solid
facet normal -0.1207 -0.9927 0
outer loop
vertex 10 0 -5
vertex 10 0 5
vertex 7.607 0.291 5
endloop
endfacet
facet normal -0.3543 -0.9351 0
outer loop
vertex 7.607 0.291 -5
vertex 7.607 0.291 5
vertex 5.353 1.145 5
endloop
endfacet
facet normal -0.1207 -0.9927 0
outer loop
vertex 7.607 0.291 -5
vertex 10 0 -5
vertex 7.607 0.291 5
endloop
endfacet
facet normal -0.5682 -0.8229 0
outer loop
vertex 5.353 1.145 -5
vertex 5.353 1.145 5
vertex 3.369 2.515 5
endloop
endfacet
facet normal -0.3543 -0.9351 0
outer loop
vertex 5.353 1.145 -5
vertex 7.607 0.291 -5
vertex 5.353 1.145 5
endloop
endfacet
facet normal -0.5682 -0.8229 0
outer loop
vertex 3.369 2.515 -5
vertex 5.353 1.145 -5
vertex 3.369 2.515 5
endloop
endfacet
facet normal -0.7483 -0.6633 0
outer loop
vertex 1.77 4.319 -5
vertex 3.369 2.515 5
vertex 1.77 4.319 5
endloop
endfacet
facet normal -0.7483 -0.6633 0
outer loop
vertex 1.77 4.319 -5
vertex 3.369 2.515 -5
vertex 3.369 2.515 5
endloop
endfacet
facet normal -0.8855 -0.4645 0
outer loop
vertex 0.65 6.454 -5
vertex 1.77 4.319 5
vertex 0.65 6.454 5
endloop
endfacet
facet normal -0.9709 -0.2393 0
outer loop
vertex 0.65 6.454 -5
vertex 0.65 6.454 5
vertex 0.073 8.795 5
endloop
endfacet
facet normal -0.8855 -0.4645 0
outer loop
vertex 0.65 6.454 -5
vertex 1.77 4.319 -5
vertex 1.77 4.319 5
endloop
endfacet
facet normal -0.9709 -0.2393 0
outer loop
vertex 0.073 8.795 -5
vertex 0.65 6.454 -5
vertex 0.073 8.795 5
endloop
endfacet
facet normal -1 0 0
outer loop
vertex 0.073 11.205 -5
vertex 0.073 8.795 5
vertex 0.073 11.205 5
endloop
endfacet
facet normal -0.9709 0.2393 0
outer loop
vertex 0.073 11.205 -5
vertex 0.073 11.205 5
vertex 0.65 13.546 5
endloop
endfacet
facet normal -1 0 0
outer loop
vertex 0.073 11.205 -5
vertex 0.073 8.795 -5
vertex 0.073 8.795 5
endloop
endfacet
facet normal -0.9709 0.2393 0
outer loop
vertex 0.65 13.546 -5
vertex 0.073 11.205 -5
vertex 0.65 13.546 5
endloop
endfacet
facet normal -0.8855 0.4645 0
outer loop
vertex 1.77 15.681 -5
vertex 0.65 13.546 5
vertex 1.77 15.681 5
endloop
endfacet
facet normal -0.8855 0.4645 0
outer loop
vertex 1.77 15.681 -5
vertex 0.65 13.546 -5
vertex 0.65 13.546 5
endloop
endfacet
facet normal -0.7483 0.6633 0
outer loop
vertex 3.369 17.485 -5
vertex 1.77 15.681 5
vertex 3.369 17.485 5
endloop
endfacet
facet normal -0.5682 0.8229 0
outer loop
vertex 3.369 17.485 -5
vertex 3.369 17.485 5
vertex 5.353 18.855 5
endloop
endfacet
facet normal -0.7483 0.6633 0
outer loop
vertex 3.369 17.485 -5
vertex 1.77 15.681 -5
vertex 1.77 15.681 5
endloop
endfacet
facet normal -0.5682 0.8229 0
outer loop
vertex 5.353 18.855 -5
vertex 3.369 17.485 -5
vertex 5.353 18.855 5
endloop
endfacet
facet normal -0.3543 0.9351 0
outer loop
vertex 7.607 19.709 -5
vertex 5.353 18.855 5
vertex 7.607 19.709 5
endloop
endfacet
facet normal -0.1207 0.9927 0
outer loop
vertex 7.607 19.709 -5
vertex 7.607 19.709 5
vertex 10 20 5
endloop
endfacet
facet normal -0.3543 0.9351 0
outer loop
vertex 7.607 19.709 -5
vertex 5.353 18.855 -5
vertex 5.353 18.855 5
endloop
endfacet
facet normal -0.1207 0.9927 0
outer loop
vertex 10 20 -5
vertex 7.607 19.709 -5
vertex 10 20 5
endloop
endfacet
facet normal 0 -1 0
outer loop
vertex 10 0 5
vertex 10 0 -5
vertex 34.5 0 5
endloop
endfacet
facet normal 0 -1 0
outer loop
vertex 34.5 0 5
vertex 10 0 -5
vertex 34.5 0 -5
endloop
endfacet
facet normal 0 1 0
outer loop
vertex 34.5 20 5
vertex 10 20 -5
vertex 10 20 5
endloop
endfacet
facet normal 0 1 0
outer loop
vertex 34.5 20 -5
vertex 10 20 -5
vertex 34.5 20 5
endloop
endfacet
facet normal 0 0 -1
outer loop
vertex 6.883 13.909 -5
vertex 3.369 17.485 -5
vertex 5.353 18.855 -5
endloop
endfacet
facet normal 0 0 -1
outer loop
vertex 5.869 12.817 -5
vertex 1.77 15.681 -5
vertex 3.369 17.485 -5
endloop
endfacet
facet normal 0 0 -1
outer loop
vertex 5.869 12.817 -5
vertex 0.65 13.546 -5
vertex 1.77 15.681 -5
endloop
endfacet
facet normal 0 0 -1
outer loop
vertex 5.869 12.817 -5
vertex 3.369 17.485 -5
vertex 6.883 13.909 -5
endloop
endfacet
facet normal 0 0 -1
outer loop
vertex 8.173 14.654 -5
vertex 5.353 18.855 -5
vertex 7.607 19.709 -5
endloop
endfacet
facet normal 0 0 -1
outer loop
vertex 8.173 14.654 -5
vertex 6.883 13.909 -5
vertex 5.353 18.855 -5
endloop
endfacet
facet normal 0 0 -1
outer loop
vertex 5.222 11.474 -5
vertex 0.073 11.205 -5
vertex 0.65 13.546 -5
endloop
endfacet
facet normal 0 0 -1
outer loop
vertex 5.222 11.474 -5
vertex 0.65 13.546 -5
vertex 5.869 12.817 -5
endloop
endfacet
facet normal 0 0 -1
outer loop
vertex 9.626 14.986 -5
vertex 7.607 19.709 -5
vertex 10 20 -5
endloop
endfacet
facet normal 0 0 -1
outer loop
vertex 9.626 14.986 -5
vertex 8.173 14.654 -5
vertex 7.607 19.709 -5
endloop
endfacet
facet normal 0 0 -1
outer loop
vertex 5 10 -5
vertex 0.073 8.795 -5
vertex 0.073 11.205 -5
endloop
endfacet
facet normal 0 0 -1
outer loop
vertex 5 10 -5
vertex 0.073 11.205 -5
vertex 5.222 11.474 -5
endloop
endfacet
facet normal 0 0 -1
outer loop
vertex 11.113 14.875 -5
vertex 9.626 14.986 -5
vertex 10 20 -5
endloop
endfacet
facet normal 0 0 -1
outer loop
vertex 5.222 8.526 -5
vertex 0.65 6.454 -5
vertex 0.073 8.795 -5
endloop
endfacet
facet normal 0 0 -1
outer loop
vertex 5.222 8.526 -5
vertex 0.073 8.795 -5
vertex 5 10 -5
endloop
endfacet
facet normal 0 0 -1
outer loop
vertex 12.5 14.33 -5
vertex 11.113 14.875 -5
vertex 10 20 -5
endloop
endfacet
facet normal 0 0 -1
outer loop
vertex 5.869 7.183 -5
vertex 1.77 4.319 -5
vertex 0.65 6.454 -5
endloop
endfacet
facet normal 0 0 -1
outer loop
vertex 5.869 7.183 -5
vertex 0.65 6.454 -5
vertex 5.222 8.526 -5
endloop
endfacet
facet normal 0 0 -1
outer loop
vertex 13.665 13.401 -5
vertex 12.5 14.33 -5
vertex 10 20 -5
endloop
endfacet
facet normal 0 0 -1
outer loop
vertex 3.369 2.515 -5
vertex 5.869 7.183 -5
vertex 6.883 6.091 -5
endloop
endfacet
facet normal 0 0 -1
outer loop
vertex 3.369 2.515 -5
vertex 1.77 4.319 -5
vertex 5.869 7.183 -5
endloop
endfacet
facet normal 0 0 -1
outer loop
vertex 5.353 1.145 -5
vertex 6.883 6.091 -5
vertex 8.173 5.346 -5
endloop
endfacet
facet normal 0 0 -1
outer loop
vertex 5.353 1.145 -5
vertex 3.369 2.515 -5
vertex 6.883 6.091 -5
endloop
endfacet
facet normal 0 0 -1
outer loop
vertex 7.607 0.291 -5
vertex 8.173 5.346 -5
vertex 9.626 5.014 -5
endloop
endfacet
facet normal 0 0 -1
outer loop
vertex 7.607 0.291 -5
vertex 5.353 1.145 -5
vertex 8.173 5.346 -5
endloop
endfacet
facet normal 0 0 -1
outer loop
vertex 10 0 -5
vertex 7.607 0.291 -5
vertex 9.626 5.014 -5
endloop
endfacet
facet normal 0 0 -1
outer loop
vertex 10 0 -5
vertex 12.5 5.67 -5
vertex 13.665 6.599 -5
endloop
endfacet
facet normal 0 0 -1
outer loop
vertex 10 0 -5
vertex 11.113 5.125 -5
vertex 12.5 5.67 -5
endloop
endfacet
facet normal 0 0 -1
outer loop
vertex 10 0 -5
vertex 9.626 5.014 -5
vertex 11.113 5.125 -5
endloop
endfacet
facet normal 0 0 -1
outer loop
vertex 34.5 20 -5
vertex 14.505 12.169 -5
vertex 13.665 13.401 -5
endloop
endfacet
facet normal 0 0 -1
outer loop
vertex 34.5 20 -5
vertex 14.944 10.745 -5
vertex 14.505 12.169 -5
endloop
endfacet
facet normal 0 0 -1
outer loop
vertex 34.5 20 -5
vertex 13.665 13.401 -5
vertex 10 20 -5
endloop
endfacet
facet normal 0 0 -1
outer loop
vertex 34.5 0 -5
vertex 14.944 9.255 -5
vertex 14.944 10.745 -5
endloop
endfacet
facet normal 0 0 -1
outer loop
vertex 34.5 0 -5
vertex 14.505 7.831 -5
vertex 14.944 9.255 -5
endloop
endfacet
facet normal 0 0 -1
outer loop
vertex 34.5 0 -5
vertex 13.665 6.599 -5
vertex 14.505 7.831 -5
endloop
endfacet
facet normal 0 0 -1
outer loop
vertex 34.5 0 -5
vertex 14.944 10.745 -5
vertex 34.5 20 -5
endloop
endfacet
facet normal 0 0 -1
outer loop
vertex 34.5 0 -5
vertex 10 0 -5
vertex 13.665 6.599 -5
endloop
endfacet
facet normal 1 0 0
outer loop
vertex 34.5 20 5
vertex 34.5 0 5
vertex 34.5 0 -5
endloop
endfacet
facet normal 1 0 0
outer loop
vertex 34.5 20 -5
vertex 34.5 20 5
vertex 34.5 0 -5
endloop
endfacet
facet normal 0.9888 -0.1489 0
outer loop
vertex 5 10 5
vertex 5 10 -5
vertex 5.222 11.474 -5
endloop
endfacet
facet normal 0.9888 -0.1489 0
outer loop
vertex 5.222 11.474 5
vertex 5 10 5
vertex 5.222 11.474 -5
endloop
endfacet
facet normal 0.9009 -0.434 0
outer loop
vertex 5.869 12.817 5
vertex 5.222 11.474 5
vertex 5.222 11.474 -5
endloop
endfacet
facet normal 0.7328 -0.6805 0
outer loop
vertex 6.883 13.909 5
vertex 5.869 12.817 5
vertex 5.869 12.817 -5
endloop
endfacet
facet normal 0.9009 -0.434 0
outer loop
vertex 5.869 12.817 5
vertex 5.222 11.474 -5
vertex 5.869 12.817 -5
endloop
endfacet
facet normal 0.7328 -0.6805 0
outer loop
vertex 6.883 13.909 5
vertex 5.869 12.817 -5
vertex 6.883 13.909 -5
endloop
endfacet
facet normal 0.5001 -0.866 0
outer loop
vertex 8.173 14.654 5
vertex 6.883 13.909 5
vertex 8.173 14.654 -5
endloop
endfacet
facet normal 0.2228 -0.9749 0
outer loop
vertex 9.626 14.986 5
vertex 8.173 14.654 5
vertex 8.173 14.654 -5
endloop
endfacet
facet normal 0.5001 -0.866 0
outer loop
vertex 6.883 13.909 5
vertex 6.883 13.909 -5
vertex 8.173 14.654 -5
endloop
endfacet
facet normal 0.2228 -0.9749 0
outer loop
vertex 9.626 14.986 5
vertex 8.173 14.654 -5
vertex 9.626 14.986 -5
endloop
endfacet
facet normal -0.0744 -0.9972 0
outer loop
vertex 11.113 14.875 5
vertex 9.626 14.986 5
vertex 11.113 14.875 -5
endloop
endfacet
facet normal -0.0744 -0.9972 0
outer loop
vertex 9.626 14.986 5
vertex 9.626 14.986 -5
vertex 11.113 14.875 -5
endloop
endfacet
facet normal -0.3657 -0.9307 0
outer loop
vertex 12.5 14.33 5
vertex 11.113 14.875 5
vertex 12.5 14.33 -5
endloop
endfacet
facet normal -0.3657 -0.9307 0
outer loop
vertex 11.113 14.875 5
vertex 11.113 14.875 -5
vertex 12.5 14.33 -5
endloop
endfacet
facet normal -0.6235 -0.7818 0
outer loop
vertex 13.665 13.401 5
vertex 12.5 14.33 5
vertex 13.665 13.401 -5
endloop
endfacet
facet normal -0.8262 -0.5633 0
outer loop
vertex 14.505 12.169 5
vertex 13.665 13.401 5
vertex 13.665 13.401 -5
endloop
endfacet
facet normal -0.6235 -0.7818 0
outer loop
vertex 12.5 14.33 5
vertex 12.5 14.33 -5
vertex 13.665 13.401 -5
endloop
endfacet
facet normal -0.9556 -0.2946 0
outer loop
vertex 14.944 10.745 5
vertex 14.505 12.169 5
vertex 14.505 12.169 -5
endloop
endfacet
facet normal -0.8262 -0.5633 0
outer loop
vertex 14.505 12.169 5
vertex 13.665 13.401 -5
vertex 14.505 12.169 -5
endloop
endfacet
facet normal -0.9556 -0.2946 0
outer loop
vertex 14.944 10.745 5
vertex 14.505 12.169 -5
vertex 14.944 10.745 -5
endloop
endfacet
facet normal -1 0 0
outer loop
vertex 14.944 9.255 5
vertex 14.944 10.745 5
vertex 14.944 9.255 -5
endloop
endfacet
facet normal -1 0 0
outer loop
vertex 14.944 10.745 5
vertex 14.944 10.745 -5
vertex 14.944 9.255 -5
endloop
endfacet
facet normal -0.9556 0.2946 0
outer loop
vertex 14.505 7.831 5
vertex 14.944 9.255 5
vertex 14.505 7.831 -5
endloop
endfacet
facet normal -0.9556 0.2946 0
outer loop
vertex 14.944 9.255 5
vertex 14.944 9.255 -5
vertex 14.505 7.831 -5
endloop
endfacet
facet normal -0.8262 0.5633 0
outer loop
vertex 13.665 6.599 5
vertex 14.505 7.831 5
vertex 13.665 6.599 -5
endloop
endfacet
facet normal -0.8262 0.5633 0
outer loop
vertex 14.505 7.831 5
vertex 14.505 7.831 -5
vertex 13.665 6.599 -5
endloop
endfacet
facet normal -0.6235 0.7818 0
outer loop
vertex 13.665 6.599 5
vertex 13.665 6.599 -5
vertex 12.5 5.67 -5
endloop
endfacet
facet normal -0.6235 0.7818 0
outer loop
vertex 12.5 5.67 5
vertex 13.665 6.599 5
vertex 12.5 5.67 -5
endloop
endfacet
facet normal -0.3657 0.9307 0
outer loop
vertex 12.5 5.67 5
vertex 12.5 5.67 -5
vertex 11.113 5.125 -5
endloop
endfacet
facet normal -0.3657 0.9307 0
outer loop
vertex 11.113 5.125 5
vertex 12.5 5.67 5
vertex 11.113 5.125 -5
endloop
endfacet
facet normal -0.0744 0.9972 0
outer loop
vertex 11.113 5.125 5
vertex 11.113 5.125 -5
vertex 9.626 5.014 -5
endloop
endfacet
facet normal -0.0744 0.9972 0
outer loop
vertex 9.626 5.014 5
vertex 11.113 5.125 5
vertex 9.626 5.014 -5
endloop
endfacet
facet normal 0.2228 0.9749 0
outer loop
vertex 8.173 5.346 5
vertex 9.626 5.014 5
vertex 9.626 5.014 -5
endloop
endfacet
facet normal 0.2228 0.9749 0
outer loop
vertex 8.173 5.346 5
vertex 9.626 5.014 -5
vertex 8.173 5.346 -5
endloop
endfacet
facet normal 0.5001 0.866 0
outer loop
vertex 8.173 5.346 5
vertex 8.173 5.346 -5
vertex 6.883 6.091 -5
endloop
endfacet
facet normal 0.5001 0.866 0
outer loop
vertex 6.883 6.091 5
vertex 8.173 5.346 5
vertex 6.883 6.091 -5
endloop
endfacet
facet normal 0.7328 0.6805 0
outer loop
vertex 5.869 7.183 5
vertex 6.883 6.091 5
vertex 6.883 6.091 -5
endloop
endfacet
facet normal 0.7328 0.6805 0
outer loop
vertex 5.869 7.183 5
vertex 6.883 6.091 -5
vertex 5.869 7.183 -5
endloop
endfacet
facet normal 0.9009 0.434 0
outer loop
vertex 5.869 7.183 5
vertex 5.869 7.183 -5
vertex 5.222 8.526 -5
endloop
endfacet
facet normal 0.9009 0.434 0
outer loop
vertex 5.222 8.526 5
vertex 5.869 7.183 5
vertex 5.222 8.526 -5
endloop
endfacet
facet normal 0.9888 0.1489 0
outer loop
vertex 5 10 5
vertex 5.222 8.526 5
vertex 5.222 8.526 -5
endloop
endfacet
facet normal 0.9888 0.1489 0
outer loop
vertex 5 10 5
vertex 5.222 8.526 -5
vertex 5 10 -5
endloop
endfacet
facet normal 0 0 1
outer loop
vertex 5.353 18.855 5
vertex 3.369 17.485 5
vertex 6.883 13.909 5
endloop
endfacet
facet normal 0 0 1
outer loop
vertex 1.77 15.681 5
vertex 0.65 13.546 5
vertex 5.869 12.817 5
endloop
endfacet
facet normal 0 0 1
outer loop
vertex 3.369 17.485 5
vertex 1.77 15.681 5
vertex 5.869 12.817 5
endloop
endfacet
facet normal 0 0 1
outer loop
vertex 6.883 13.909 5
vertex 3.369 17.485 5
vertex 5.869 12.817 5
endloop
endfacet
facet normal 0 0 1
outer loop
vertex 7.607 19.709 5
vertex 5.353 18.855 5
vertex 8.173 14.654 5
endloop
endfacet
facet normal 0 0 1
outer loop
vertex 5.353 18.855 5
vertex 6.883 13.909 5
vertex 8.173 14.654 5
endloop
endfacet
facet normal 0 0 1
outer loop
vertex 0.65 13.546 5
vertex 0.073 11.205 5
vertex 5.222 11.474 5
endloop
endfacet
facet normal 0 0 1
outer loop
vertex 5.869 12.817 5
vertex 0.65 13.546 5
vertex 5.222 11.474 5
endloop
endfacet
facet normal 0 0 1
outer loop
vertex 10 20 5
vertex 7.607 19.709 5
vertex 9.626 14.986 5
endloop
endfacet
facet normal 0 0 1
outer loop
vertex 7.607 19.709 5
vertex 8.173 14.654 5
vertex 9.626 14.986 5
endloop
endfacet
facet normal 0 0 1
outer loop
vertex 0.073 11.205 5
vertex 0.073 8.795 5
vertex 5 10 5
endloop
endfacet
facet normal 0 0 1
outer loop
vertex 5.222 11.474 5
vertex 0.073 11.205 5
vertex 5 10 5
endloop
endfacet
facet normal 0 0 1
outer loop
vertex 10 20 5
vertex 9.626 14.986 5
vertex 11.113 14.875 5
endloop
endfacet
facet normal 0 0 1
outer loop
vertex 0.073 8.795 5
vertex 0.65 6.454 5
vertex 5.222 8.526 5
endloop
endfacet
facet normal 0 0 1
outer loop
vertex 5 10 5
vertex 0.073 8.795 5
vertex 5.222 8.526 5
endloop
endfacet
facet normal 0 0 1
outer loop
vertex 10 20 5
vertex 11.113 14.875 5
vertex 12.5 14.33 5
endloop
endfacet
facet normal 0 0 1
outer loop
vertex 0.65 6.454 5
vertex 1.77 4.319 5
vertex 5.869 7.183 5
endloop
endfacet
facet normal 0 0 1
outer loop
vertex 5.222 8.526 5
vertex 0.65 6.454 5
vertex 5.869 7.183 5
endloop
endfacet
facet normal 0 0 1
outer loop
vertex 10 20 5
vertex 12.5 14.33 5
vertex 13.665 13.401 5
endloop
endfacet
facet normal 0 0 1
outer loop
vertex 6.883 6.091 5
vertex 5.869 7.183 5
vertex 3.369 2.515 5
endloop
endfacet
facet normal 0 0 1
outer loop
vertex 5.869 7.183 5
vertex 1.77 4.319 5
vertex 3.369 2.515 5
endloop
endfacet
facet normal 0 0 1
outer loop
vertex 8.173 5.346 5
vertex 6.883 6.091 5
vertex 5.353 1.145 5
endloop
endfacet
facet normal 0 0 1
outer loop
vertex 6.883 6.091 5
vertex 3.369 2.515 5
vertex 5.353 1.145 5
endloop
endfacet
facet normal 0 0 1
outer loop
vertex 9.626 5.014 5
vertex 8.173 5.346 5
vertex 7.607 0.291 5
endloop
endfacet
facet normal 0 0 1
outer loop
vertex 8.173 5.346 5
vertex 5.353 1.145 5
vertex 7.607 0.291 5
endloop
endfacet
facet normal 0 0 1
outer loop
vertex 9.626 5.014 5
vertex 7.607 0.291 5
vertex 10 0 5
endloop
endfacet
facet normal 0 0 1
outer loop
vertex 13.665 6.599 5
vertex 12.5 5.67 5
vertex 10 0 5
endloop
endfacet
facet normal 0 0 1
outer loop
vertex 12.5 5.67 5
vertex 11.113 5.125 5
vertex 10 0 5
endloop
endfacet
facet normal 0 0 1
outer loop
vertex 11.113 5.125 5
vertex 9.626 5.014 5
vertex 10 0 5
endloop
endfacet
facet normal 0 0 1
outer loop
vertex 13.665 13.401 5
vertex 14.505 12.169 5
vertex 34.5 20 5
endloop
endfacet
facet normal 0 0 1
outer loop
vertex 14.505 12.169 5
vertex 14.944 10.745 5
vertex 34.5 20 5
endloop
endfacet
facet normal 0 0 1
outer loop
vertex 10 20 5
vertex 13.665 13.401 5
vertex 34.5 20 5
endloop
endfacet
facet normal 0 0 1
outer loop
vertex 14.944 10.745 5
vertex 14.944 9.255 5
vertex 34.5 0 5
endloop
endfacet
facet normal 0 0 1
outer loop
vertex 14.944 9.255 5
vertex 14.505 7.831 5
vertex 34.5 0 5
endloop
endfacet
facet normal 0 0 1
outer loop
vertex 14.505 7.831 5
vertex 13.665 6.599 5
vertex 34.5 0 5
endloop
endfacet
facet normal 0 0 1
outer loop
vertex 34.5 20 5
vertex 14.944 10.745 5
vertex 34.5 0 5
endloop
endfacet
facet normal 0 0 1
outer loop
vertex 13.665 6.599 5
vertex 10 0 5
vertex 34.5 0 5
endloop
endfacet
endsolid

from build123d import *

# Parameters (mm, degrees)
SKETCH7_W           = 34.5
SKETCH7_H           = 10
BOSS_EXTRUDE3_DEPTH = 20
CUT_EXTRUDE9_DEPTH  = 26
SKETCH9_R           = 5
CUT_EXTRUDE10_DEPTH = 26


with BuildPart() as part:
    # Sketch7 → Boss-Extrude3 (new body)
    with BuildSketch(Plane(origin=(0, 0, 0), x_dir=(1, 0, 0), z_dir=(0, 1, 0))):
        with Locations((17.25, 0)):
            Rectangle(SKETCH7_W, SKETCH7_H)
    extrude(amount=BOSS_EXTRUDE3_DEPTH)

    # Sketch8 → Cut-Extrude9 (cut)
    with BuildSketch(Plane(origin=(0, 0, -5), x_dir=(-1, 0, 0), z_dir=(0, 0, -1))):
        with BuildLine():
            Line((-10, 20), (6.269101311, 20))
            Line((6.269101311, 20), (6.269101311, 0))
            Line((6.269101311, 0), (-10, 0))
            ThreePointArc((-10, 0), (0, 10), (-10, 20))
        make_face()
    extrude(amount=-CUT_EXTRUDE9_DEPTH, mode=Mode.SUBTRACT)

    # Sketch9 → Cut-Extrude10 (cut)
    with BuildSketch(Plane(origin=(0, 0, -5), x_dir=(-1, 0, 0), z_dir=(0, 0, -1))):
        with Locations((-10, 10)):
            Circle(SKETCH9_R)
    extrude(amount=-CUT_EXTRUDE10_DEPTH, mode=Mode.SUBTRACT)


solid = part.part
